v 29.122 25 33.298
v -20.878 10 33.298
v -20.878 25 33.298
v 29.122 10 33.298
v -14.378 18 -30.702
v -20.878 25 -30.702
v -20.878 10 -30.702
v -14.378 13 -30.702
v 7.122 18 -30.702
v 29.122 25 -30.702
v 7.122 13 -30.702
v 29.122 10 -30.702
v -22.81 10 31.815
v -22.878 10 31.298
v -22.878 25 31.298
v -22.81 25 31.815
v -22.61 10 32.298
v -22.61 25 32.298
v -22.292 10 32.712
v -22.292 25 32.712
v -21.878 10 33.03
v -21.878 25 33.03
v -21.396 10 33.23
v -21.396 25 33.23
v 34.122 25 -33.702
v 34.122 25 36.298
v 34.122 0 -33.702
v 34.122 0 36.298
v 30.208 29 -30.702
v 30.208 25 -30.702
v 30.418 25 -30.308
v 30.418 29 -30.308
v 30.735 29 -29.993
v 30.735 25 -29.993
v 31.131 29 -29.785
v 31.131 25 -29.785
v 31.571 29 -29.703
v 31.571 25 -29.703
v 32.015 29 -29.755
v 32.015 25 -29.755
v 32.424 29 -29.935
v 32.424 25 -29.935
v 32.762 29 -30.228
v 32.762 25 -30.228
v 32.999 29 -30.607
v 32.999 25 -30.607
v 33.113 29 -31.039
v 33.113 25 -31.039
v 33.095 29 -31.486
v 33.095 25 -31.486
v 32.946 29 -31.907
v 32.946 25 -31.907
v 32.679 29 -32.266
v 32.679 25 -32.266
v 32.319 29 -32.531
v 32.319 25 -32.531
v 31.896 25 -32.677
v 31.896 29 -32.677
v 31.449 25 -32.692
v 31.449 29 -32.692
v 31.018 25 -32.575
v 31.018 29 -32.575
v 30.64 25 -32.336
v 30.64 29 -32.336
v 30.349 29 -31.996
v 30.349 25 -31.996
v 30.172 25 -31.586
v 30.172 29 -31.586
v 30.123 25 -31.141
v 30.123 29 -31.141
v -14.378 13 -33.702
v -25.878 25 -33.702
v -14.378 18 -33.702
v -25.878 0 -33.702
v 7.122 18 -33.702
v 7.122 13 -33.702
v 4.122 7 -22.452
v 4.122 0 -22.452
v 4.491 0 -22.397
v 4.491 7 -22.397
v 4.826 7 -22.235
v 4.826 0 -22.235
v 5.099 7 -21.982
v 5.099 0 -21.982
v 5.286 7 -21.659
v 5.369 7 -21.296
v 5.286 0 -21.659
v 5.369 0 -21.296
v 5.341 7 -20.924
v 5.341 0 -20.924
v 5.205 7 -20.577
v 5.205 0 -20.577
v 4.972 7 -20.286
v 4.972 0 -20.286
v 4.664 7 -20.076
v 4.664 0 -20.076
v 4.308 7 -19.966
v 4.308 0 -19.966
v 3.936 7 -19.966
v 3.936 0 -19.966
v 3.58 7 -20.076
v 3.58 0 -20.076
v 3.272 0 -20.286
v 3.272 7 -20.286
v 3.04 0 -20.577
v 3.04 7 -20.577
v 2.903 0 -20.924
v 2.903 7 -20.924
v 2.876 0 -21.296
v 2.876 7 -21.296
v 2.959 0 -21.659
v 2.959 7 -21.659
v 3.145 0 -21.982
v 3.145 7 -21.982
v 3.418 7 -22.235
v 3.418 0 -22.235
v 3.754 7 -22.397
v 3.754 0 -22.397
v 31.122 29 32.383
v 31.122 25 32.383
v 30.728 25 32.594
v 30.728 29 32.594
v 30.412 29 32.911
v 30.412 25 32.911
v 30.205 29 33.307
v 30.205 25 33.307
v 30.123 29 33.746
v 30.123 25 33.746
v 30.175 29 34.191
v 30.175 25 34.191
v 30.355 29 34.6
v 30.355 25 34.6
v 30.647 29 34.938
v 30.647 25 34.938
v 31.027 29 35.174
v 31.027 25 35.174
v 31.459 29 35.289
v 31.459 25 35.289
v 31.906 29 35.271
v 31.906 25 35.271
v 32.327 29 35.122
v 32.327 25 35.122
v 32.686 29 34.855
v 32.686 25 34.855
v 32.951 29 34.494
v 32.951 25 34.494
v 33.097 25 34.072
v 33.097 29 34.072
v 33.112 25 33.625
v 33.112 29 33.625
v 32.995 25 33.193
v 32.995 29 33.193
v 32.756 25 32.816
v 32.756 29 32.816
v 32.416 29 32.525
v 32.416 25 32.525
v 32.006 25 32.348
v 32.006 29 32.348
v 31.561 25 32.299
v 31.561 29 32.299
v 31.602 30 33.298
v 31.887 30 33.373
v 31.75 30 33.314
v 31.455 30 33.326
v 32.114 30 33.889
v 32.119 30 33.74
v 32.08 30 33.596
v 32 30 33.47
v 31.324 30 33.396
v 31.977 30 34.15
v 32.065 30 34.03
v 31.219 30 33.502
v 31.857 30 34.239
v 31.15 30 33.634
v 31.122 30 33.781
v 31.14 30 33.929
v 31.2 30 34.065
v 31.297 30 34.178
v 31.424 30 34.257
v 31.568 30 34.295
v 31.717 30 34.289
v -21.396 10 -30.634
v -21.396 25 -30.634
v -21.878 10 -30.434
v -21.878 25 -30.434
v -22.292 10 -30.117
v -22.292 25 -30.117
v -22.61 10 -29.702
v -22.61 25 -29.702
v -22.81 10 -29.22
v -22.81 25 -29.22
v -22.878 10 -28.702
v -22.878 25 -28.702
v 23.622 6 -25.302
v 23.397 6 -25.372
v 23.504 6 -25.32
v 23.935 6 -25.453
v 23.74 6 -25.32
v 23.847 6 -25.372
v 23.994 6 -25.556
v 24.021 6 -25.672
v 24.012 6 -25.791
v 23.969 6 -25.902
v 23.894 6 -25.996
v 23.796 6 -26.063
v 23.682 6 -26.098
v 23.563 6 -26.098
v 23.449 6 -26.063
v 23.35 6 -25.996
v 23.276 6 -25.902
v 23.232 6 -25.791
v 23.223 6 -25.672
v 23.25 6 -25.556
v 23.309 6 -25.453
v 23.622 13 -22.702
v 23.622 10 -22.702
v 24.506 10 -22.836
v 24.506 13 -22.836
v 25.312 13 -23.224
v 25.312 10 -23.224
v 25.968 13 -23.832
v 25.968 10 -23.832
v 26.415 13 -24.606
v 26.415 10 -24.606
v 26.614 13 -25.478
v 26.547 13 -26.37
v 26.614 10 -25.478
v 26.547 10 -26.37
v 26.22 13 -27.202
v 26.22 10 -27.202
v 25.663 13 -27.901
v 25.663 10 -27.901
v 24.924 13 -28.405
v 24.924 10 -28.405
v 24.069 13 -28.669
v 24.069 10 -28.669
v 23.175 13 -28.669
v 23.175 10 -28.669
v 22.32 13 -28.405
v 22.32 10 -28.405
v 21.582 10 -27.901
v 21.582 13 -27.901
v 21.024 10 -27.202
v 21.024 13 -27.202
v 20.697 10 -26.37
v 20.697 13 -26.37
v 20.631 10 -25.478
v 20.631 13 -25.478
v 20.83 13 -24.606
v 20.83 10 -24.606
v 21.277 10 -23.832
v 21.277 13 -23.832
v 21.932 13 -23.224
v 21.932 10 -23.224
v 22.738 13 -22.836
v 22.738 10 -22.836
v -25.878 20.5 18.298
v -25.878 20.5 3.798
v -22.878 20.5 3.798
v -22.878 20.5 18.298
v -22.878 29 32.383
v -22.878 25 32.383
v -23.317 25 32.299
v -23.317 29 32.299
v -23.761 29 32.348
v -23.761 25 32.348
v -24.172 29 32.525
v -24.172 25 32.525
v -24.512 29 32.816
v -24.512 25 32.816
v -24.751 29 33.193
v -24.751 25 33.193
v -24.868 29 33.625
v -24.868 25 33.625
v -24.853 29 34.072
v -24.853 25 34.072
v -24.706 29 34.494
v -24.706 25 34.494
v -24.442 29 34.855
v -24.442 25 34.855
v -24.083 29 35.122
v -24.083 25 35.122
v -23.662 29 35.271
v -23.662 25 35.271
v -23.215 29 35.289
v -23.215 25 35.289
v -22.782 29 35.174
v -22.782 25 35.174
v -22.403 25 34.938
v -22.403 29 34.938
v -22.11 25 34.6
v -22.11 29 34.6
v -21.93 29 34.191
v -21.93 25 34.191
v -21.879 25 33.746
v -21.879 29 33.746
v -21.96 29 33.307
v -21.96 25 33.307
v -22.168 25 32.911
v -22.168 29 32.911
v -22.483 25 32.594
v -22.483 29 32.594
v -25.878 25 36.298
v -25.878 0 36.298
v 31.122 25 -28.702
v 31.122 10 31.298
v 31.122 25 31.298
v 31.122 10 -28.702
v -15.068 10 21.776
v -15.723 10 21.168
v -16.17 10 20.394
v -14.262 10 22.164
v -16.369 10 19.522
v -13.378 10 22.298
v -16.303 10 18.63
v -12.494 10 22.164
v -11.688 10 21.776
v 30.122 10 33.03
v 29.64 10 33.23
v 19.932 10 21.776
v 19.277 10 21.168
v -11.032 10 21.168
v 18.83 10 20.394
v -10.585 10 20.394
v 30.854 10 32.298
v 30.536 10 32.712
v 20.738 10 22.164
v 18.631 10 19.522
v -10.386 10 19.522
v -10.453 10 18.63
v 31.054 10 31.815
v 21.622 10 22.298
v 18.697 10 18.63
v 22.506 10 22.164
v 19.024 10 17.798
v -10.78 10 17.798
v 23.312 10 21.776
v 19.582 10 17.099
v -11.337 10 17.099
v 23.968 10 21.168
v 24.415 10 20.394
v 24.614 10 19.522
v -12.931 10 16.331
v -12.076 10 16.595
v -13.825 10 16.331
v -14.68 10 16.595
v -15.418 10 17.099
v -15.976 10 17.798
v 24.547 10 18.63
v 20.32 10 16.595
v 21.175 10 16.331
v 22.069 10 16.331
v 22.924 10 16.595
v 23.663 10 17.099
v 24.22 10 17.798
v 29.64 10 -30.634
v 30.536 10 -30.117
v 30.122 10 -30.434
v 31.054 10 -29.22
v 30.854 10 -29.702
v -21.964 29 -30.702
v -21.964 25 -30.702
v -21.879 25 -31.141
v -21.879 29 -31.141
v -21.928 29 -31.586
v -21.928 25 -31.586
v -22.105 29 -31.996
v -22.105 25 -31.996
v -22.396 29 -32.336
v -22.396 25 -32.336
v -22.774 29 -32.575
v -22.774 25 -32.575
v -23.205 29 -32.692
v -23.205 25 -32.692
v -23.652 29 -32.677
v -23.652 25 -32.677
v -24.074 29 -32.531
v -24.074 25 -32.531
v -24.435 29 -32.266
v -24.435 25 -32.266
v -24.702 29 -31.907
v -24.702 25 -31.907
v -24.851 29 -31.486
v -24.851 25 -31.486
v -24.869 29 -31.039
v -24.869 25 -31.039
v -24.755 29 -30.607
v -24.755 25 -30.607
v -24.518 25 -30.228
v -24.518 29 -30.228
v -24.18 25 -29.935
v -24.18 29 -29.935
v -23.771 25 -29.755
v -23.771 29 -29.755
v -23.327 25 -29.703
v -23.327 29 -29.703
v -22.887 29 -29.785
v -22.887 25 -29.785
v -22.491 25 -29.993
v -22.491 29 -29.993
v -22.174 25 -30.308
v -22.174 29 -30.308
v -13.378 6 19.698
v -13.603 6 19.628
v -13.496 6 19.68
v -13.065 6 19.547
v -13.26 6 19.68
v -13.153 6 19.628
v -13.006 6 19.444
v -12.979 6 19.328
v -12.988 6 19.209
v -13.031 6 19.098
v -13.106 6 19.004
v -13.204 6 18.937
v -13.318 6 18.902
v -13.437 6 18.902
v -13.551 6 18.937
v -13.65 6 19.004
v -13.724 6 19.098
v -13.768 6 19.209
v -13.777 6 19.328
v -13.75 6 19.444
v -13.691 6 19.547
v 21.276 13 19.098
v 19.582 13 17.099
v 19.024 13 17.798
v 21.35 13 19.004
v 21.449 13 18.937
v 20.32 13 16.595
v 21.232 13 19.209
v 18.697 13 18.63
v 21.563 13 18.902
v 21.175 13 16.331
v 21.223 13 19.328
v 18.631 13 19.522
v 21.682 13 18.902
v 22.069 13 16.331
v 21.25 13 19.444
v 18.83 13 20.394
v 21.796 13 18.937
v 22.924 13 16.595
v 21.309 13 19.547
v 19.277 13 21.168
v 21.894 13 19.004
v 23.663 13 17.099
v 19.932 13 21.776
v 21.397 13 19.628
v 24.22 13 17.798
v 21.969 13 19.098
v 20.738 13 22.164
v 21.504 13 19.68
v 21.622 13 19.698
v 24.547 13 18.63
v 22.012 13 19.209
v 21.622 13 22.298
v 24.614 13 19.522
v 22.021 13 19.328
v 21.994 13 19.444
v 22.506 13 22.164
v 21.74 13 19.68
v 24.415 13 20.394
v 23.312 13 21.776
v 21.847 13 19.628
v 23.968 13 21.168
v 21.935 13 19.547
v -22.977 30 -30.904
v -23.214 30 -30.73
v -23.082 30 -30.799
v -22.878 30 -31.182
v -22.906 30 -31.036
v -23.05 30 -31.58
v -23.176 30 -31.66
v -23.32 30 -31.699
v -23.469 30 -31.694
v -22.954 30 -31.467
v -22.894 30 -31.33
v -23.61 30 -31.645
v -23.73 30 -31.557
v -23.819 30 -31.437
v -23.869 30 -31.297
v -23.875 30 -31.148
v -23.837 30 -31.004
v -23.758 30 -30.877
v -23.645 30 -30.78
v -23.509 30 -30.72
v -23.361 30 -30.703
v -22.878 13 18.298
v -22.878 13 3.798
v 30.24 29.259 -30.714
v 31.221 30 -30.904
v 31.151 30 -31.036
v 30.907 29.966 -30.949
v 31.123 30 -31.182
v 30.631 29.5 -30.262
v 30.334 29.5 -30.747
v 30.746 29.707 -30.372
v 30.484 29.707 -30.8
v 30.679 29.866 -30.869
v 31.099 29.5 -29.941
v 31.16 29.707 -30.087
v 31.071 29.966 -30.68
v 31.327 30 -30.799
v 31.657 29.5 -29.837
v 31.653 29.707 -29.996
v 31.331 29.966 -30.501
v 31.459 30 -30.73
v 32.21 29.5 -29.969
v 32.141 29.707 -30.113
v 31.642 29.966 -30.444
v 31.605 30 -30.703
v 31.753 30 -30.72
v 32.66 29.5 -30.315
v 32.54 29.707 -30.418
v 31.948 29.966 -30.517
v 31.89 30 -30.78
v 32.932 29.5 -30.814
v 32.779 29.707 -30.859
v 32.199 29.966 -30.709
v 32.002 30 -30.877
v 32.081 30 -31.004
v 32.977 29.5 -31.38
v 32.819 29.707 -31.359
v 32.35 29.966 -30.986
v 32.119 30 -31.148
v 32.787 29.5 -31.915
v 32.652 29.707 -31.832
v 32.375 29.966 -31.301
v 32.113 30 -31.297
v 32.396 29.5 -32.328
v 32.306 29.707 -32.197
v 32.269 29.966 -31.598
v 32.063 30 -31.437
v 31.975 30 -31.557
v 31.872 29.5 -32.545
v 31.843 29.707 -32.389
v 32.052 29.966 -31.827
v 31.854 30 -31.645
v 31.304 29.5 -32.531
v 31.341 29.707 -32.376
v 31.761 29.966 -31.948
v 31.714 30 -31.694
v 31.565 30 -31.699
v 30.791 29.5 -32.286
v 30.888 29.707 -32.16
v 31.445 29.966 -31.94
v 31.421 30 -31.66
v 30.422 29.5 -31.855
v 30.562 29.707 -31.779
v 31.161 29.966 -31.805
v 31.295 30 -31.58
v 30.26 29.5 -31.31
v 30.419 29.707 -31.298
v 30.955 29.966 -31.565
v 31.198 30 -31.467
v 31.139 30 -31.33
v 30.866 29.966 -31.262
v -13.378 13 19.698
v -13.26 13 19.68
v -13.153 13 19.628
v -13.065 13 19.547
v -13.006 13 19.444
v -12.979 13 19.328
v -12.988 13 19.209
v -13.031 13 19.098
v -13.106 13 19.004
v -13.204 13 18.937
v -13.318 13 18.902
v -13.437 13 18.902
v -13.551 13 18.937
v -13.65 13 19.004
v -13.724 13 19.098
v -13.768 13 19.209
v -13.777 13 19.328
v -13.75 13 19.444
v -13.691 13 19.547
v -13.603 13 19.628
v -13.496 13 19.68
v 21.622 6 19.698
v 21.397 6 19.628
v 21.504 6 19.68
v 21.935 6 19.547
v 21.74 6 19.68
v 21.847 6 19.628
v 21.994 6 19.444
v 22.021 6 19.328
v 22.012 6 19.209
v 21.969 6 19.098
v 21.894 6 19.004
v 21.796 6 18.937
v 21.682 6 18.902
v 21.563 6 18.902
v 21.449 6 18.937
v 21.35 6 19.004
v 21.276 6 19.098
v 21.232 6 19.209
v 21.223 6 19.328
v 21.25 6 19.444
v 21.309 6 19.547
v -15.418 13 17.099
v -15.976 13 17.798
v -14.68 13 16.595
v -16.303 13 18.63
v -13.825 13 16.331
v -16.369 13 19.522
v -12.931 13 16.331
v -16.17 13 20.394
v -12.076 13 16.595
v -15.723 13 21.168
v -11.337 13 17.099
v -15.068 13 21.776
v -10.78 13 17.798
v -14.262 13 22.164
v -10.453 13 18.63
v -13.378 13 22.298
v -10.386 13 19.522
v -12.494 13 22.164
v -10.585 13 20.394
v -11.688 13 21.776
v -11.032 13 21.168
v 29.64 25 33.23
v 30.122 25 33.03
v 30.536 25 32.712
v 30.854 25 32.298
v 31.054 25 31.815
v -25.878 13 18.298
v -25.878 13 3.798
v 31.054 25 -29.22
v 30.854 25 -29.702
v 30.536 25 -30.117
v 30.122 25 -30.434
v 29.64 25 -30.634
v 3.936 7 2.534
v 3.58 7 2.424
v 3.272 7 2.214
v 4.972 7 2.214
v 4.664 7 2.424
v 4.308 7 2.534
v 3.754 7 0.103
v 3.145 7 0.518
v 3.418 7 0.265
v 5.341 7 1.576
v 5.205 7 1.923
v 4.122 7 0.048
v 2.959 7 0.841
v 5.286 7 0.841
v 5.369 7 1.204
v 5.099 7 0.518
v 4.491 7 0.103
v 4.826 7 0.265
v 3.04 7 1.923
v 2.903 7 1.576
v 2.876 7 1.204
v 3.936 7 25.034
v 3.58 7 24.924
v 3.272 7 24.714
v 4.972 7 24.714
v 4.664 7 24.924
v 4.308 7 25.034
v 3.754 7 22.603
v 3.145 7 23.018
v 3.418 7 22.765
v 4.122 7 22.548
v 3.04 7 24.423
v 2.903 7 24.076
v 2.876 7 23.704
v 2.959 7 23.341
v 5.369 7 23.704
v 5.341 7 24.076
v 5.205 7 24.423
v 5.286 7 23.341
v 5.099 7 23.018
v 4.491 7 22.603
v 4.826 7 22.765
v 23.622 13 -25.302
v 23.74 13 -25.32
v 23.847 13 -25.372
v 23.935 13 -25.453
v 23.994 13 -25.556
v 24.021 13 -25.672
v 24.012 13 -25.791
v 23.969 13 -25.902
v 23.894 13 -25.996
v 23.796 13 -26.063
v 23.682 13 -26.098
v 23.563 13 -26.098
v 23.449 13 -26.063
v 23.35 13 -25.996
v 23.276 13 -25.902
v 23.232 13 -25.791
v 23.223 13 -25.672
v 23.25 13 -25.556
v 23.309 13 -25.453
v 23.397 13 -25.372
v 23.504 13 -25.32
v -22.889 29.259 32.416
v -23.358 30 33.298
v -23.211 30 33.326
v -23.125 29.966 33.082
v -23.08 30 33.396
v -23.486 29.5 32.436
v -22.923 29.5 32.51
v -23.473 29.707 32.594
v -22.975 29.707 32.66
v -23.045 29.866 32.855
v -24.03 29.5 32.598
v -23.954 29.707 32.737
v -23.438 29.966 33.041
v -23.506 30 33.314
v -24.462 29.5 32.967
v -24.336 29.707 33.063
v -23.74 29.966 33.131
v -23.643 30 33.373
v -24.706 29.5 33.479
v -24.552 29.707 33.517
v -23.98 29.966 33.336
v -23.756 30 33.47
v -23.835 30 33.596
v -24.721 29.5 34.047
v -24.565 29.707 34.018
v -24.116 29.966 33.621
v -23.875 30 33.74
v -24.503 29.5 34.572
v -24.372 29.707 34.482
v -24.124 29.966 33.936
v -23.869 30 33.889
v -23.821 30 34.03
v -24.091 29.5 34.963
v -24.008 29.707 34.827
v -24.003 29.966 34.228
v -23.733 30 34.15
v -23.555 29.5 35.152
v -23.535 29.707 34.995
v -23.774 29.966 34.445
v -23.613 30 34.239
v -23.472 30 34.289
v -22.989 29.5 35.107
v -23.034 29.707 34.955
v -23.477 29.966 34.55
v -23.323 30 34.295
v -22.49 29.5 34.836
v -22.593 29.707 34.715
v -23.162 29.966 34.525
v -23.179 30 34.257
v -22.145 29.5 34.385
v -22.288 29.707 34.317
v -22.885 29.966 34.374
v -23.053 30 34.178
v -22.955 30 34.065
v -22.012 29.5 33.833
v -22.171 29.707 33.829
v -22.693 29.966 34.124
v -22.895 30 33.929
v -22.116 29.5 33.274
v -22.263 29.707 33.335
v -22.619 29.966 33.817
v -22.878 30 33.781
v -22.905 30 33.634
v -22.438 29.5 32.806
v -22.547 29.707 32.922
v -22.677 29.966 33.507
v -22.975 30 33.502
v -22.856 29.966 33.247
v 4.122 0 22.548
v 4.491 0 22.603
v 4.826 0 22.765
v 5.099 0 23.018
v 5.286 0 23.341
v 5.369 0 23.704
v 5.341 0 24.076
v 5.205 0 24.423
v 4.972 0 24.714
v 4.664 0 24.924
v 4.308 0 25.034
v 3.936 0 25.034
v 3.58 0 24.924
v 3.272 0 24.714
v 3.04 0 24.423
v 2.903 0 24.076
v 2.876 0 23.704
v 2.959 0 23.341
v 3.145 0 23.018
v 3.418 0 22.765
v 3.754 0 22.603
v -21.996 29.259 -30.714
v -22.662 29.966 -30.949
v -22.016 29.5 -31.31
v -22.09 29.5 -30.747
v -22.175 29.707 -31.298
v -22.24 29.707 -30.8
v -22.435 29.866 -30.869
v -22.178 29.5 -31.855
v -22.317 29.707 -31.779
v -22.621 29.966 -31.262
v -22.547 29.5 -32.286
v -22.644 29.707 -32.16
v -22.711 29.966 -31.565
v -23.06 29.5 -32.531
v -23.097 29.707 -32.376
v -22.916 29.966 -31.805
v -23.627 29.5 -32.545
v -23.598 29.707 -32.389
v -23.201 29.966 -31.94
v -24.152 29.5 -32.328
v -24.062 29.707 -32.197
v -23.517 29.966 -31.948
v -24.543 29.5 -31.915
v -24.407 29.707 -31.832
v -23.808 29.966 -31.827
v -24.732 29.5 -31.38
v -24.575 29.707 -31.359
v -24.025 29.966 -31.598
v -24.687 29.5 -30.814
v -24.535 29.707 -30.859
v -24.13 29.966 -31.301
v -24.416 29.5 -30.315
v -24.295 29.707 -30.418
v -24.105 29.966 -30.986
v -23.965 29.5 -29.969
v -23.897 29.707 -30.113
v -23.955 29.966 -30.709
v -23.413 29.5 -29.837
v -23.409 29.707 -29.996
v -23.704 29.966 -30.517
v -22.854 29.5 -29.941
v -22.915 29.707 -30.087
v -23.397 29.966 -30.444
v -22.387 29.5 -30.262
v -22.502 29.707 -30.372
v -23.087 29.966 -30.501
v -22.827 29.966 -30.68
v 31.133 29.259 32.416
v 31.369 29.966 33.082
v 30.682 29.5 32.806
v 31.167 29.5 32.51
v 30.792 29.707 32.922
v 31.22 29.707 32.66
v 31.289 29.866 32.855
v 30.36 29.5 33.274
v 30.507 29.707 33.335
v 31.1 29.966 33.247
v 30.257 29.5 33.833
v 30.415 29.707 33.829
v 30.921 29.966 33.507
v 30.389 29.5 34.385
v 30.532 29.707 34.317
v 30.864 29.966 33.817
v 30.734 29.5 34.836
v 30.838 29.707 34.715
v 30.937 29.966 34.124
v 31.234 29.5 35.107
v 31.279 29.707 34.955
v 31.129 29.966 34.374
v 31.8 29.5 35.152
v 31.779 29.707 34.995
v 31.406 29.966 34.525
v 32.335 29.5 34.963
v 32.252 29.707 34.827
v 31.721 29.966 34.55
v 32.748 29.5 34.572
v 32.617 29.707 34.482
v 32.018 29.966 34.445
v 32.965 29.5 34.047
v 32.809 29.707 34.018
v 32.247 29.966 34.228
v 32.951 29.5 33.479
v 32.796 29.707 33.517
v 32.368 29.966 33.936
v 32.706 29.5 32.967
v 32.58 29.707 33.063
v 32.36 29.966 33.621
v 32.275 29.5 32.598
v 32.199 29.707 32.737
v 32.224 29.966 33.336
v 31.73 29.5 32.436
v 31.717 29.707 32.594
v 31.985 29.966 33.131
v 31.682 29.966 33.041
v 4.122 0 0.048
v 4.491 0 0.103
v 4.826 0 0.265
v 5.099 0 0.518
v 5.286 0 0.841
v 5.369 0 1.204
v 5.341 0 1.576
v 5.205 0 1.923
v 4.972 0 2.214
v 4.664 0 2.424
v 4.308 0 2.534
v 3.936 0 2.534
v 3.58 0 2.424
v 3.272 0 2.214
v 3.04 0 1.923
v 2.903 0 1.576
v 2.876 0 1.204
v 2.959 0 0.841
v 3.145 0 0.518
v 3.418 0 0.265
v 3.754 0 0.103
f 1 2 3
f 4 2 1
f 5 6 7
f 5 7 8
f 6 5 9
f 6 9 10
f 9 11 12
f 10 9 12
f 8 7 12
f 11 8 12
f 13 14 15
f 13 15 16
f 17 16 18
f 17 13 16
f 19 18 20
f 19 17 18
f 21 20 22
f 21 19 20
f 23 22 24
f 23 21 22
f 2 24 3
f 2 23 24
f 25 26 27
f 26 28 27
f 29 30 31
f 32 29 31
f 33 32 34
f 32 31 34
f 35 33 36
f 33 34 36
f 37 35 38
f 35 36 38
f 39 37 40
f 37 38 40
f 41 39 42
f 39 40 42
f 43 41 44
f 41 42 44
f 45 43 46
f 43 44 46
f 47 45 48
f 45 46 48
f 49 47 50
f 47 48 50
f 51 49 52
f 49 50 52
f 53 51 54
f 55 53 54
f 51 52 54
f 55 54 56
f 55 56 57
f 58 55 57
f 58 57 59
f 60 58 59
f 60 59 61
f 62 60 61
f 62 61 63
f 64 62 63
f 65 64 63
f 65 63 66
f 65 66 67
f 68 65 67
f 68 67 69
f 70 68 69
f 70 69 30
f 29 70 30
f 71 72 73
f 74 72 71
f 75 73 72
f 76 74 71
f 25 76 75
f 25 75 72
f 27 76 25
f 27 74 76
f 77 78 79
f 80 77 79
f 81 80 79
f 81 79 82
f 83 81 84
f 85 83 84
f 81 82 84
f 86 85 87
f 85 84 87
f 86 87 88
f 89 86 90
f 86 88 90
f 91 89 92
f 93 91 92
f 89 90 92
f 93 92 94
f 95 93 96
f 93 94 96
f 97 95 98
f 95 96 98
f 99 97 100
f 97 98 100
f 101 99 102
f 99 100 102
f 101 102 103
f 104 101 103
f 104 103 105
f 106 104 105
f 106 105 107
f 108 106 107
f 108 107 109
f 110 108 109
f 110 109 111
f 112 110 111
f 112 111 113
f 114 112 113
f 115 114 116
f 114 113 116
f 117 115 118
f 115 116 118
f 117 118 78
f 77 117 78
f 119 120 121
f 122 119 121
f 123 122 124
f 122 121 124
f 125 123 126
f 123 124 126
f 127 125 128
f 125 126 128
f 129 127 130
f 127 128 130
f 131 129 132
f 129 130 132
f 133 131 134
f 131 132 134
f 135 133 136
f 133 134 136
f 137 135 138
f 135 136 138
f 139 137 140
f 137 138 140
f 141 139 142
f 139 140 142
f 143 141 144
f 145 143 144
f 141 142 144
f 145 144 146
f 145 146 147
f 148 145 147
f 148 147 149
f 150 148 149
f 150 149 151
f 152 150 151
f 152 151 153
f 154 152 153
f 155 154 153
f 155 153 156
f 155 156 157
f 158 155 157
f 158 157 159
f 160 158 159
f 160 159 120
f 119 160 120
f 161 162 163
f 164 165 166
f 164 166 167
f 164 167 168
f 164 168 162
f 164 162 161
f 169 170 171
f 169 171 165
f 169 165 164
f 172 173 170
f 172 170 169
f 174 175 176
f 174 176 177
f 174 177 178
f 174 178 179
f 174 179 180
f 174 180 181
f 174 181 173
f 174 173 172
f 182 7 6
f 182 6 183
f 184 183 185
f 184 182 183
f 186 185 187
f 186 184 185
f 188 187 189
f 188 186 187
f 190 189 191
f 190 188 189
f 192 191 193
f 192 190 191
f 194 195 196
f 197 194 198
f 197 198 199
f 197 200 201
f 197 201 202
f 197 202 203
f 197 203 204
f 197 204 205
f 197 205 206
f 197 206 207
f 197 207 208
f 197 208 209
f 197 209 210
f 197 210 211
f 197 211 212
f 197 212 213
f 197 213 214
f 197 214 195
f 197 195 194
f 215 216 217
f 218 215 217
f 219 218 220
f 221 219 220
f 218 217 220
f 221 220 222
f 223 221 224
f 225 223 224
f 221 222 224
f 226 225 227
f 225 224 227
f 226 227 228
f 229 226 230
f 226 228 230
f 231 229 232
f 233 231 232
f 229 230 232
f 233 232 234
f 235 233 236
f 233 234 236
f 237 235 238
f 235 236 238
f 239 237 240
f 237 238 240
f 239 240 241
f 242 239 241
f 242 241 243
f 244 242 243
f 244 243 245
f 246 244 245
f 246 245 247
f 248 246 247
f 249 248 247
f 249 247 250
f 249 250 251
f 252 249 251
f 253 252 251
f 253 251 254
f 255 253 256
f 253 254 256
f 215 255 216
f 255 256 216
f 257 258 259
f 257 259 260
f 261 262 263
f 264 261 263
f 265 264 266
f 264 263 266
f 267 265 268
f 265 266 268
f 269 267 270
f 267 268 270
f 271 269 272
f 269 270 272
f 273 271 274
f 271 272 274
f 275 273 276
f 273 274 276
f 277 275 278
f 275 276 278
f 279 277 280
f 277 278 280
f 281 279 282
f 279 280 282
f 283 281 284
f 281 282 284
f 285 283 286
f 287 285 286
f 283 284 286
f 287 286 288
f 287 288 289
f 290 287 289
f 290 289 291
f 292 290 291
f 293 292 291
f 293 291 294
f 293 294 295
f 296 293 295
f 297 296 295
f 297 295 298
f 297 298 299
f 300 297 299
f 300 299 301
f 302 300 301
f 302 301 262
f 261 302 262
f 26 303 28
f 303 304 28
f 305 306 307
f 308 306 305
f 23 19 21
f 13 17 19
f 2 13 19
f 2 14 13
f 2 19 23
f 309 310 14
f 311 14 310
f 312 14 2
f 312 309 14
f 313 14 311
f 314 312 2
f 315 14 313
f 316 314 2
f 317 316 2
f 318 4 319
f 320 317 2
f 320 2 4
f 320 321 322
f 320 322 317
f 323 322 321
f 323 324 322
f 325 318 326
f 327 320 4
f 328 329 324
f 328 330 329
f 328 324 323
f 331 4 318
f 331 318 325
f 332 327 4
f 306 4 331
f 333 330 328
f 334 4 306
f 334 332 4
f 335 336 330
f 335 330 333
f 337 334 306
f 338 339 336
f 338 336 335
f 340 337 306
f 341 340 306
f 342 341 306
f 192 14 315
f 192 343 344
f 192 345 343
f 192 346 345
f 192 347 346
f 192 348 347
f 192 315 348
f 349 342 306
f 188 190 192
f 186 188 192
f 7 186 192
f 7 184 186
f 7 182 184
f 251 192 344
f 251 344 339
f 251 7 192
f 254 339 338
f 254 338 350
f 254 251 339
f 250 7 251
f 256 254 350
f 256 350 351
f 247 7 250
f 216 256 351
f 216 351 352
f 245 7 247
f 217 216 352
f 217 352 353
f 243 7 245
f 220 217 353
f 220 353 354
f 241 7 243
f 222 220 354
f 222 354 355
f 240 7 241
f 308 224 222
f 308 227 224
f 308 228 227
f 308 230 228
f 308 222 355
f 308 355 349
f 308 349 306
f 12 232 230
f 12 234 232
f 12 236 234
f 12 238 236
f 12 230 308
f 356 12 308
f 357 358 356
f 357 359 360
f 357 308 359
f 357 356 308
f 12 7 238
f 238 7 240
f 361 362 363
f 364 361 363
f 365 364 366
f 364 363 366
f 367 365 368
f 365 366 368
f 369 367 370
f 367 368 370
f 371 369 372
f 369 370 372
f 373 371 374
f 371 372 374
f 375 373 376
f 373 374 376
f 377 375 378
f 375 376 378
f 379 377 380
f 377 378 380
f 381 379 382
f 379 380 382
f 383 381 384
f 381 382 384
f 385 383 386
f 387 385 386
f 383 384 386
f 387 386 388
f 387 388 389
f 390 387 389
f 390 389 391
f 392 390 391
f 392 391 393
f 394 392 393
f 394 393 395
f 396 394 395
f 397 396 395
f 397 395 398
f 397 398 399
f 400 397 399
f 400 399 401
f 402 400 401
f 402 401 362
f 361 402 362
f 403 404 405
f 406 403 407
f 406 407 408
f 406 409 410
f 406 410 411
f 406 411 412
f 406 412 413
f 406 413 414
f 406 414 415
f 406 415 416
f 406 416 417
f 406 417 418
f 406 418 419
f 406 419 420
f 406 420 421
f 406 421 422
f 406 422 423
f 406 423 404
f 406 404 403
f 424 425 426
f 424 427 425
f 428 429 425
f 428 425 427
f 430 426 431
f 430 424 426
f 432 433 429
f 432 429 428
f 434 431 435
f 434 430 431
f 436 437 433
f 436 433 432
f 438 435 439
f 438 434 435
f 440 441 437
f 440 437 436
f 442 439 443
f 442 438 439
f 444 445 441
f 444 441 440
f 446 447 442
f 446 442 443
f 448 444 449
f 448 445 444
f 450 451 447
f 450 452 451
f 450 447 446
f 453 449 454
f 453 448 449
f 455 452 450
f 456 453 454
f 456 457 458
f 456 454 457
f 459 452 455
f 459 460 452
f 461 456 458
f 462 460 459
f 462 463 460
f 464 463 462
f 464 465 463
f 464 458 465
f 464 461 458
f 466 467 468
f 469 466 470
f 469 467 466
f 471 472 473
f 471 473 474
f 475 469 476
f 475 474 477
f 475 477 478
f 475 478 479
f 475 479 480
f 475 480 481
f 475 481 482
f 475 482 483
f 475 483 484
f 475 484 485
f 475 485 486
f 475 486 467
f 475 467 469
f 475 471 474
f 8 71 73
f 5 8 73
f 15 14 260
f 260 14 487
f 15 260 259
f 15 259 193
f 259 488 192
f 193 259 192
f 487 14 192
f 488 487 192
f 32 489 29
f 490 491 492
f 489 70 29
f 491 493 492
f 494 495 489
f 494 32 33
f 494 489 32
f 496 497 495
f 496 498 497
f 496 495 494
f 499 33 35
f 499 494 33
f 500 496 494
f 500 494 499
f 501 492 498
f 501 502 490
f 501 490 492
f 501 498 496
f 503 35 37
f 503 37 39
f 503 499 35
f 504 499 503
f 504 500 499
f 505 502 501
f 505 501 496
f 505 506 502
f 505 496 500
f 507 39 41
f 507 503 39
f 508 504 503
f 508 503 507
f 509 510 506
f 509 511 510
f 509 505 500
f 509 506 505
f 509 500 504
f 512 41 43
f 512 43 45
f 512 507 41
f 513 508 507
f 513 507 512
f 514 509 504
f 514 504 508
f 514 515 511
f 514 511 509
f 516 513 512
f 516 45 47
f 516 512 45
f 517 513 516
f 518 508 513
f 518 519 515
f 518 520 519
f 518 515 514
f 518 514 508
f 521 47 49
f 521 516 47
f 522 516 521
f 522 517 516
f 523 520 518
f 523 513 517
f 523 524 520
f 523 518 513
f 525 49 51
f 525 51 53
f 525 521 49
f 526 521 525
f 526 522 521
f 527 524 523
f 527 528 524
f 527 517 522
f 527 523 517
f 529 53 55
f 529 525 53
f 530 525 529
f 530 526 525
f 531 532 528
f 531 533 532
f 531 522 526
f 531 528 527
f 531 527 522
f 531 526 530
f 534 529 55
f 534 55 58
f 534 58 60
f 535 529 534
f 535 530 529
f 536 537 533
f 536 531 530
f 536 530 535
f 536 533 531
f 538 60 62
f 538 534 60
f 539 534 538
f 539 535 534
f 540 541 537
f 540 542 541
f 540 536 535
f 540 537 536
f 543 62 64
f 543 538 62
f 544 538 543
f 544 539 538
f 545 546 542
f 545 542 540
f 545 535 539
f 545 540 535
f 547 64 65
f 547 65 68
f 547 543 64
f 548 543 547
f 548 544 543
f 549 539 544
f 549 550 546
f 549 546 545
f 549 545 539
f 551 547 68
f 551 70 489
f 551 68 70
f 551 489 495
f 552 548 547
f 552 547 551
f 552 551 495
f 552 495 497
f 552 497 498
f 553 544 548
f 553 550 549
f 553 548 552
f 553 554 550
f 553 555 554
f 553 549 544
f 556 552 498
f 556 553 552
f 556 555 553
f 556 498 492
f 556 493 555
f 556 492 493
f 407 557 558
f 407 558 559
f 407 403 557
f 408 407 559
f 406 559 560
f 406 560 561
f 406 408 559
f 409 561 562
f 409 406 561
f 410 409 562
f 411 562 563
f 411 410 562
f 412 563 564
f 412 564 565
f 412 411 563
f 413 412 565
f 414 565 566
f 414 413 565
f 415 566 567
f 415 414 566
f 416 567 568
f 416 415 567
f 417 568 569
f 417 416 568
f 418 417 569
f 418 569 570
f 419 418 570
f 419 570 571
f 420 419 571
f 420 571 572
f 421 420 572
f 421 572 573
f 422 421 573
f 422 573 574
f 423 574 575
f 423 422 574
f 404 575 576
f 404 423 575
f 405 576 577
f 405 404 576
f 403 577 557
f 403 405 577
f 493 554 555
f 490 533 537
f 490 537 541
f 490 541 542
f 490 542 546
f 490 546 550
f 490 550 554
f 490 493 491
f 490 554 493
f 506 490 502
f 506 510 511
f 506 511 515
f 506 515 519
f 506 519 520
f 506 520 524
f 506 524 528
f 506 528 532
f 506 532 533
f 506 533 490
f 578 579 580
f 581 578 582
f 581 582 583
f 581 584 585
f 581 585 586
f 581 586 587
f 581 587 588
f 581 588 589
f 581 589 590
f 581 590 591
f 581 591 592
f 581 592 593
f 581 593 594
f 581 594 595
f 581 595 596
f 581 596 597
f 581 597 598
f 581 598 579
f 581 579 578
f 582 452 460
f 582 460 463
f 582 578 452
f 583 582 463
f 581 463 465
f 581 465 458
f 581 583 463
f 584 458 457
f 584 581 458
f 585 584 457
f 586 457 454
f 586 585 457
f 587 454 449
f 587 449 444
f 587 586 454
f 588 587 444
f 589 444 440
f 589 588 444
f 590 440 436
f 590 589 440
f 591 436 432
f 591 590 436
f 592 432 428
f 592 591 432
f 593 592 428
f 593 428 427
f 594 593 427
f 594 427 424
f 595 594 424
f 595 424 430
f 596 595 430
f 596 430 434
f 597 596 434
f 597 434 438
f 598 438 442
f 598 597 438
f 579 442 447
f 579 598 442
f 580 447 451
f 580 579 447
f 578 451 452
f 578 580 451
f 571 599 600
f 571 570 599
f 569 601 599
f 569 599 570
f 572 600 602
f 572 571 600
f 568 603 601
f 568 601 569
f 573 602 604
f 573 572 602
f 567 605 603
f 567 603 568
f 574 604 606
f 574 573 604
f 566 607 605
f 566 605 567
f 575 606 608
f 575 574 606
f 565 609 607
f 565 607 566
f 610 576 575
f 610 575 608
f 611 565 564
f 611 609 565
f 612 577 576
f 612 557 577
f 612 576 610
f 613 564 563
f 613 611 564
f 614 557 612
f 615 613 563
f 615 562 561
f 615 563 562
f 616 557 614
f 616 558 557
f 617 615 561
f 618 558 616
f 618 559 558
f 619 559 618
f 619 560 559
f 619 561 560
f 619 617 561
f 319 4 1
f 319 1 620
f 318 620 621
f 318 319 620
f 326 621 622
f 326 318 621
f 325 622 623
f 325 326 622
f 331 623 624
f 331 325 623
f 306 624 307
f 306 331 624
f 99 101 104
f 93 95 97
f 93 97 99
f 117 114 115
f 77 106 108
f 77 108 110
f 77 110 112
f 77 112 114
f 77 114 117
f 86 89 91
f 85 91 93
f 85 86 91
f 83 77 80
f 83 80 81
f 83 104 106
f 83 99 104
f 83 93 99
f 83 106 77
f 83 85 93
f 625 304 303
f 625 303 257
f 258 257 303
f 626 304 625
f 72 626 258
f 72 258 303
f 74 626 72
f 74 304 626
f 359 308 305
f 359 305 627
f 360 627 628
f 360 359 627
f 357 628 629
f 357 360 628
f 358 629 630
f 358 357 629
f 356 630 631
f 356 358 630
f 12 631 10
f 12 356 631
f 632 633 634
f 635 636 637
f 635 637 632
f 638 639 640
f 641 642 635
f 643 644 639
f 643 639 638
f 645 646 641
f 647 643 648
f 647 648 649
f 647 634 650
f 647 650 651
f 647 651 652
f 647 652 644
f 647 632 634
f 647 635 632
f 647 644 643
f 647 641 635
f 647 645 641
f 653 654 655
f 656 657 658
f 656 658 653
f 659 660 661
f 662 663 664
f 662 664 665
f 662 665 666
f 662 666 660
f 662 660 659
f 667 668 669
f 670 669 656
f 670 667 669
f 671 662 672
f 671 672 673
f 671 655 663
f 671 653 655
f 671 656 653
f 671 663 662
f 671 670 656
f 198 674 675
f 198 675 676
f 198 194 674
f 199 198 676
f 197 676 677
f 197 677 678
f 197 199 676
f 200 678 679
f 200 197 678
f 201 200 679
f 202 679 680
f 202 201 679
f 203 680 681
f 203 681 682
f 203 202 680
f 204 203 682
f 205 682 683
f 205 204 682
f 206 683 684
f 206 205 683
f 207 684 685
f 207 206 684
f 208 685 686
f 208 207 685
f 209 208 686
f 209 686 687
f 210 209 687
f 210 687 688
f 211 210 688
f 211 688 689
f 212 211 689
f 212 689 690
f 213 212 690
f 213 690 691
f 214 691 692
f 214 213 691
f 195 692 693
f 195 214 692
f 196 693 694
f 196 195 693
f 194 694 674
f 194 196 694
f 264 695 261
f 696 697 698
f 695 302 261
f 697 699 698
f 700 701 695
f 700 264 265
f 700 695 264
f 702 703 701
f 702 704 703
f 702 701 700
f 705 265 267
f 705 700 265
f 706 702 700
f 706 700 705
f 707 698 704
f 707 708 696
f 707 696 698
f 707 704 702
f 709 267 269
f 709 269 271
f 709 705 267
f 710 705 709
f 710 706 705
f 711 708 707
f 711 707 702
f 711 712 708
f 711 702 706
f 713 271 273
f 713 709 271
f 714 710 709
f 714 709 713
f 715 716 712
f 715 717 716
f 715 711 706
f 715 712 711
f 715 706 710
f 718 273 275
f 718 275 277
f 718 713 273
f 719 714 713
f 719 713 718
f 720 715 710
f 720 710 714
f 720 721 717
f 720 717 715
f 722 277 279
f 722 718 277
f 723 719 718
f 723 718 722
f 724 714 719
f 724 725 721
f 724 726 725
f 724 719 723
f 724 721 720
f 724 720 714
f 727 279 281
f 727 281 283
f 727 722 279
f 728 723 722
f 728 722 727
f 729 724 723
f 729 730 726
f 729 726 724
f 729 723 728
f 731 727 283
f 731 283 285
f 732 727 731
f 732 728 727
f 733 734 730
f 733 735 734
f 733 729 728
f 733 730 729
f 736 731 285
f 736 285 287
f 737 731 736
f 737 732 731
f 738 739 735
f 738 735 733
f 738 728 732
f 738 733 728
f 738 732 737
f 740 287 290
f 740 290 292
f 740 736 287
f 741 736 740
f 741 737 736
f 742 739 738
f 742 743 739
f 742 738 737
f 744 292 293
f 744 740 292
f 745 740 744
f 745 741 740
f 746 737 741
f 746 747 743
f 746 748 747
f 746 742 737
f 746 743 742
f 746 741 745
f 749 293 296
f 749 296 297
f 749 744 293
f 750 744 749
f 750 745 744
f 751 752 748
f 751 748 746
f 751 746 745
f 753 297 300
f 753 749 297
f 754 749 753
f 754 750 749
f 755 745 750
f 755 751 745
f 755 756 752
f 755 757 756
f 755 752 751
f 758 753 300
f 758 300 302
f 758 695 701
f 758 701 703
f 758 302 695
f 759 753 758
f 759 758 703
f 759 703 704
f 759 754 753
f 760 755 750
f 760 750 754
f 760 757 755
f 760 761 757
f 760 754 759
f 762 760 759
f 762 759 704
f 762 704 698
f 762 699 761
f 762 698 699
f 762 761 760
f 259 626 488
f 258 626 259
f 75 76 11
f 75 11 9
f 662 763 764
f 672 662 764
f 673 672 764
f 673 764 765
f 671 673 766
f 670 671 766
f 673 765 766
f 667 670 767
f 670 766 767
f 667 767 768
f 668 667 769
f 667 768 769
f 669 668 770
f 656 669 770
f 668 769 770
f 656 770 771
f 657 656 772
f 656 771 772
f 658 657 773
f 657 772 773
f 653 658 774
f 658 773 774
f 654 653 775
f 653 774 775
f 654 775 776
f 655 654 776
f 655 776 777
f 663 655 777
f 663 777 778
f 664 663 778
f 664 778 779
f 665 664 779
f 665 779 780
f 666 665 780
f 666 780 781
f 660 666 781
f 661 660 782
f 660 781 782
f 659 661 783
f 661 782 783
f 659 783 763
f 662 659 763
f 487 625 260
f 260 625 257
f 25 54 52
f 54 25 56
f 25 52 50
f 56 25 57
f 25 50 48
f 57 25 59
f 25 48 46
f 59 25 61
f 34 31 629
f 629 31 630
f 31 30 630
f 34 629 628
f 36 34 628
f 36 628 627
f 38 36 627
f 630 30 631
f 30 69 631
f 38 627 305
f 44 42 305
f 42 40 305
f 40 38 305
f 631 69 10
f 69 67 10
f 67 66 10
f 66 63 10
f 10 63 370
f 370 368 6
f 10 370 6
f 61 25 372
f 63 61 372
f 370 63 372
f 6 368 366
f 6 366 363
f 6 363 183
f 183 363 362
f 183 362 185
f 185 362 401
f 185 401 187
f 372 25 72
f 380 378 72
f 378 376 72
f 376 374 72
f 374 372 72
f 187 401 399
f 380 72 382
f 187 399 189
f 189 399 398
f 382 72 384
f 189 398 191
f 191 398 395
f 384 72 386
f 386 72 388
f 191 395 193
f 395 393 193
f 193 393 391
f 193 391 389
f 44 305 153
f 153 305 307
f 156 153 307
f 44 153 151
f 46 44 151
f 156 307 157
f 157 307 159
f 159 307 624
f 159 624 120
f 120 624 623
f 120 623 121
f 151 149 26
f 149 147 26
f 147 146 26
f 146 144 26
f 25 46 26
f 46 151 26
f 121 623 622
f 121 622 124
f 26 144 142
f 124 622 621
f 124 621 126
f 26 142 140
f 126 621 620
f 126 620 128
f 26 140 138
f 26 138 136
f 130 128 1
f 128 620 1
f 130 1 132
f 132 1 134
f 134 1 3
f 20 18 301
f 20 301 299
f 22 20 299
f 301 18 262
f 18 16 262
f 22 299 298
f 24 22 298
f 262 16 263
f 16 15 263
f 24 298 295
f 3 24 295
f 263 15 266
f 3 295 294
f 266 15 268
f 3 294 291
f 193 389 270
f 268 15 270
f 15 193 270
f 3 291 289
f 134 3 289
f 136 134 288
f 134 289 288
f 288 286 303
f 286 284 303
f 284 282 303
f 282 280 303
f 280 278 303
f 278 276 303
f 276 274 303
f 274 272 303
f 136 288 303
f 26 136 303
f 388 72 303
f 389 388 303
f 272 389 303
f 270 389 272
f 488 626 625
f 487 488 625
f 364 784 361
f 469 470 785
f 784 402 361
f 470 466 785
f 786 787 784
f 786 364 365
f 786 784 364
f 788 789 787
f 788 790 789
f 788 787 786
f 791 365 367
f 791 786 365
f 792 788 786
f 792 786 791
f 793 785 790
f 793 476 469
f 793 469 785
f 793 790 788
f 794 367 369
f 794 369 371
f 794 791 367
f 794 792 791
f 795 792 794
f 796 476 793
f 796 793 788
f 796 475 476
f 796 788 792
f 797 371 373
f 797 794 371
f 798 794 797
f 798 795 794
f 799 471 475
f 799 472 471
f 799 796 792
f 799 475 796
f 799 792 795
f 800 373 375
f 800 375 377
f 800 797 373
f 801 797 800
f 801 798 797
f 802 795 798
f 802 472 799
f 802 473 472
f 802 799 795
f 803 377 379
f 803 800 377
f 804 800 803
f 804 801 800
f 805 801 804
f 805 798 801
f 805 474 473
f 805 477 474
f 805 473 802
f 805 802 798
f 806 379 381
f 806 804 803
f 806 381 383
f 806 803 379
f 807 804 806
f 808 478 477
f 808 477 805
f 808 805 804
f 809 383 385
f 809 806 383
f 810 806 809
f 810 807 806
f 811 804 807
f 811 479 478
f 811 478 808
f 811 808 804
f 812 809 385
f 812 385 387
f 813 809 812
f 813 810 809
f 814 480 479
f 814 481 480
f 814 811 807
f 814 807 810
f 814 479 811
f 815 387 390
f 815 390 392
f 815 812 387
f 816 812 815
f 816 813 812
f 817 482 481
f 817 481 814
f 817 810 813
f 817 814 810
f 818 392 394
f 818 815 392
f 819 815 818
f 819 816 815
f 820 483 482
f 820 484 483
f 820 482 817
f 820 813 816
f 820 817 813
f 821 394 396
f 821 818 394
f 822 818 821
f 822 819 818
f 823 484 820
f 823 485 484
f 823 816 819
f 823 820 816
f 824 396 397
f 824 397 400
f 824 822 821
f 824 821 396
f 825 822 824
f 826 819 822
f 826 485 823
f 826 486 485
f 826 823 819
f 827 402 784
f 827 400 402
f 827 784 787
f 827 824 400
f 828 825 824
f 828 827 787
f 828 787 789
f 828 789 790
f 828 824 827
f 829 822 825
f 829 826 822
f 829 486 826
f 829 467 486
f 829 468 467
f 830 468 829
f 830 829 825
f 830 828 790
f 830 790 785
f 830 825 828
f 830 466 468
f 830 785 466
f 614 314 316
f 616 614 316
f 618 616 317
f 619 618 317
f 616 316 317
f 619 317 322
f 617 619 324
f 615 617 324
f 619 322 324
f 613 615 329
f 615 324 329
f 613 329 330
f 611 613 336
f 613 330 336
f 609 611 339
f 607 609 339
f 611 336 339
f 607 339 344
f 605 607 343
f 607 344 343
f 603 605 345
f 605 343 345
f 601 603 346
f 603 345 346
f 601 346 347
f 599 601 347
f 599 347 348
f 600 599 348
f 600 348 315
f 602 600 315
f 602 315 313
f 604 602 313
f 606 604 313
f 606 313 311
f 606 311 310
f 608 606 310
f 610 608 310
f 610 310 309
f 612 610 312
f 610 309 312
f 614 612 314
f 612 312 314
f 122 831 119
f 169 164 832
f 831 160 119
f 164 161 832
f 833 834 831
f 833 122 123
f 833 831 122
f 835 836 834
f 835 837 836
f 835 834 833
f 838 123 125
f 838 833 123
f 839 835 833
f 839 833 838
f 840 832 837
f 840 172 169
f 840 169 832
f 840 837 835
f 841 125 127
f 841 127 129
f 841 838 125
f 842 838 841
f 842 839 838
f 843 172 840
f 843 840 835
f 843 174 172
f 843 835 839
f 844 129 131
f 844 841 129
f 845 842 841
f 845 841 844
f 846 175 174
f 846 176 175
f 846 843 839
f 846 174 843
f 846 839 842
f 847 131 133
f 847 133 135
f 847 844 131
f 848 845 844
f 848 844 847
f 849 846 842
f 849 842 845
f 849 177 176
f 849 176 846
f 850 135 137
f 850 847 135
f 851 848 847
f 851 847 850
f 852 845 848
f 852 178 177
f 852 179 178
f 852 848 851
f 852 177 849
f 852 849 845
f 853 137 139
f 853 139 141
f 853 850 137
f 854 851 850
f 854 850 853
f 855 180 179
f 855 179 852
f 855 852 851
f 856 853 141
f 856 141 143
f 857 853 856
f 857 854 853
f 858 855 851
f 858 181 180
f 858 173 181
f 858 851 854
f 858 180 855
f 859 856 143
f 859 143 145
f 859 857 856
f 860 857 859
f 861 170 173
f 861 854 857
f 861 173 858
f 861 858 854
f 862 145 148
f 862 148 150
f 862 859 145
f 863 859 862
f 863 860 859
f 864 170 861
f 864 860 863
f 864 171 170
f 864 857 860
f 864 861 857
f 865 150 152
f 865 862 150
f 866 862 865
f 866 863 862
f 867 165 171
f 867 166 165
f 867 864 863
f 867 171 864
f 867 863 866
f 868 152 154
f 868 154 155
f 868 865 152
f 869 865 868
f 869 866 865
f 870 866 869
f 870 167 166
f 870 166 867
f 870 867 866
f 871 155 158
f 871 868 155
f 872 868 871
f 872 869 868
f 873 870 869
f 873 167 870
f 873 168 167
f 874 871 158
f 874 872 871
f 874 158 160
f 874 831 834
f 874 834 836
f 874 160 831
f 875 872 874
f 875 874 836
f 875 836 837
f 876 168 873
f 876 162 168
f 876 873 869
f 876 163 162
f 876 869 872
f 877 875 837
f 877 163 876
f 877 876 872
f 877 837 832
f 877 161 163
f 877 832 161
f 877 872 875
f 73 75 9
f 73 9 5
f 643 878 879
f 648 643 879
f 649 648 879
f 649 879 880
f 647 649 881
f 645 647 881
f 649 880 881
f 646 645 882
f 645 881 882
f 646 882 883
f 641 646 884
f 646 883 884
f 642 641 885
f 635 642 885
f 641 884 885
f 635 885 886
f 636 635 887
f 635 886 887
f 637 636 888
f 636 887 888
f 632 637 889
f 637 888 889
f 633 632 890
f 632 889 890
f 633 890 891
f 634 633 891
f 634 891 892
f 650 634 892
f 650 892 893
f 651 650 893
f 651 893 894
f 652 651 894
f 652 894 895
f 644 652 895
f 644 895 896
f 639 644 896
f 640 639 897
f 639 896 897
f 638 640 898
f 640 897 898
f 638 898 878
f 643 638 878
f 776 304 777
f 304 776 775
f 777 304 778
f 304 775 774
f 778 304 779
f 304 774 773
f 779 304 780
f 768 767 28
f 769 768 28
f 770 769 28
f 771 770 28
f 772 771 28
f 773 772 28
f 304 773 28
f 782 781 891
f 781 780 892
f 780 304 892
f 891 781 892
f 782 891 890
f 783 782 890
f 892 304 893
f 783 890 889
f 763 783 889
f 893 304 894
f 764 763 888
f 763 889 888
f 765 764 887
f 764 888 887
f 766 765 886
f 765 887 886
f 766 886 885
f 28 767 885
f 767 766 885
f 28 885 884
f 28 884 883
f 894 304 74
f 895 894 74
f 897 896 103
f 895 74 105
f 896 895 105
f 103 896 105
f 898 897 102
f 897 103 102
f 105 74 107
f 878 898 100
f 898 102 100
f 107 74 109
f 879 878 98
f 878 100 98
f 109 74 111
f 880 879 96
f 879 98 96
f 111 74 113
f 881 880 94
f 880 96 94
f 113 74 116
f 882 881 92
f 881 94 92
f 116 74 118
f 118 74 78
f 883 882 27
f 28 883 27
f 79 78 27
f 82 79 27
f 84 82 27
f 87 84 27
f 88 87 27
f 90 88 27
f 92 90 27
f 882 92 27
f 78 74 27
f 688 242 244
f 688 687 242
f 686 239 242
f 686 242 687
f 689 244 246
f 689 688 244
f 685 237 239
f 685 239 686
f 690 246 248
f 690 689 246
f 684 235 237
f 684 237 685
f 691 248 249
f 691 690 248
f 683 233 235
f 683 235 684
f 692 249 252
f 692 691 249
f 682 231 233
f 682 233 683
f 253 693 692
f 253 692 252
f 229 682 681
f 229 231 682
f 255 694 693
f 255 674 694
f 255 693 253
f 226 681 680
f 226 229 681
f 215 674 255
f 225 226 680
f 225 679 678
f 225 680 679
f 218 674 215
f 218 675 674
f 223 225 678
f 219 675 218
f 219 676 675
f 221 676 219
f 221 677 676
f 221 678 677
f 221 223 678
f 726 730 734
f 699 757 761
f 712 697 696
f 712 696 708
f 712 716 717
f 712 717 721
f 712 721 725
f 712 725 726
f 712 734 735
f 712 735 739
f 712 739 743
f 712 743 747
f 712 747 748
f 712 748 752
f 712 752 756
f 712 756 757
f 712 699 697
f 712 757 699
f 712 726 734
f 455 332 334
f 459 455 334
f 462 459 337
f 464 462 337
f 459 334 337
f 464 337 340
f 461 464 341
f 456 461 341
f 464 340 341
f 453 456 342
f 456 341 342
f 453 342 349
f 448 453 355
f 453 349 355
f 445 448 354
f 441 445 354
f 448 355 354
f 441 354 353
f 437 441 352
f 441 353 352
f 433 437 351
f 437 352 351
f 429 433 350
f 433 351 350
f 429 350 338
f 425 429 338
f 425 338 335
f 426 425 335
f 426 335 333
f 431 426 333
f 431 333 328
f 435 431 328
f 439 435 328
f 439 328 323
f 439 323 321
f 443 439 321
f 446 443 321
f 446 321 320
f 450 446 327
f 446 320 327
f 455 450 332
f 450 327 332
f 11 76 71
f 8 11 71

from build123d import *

# Parameters (mm, degrees)
SKETCH1_W           = 60
SKETCH1_H           = 70
BOSS_EXTRUDE1_DEPTH = 10
SKETCH2_W           = 60
SKETCH2_H           = 70
SKETCH2_W_2         = 54
SKETCH2_H_2         = 64
BOSS_EXTRUDE2_DEPTH = 15
SKETCH3_R           = 1.5
BOSS_EXTRUDE3_DEPTH = 5
SKETCH8_R           = 3
SKETCH8_R_2         = 0.4
BOSS_EXTRUDE4_DEPTH = 3
CUT_EXTRUDE1_START  = -4
SKETCH11_R          = 0.4
CUT_EXTRUDE1_DEPTH  = 4
SKETCH12_W          = 21.5
SKETCH12_H          = 5
CUT_EXTRUDE2_DEPTH  = 5
FILLET2_R           = 1
SKETCH18_R          = 1.25
CUT_EXTRUDE6_DEPTH  = 7
SKETCH20_W          = 14.5
SKETCH20_H          = 7.5
CUT_EXTRUDE7_DEPTH  = 7
FILLET3_R           = 2


with BuildPart() as part:
    # Sketch1 → Boss-Extrude1 (new body)
    with BuildSketch(Plane(origin=(0, 0, 0), x_dir=(1, 0, 0), z_dir=(0, 1, 0))):
        with Locations((4.122137405, -1.297709924)):
            Rectangle(SKETCH1_W, SKETCH1_H)
    extrude(amount=BOSS_EXTRUDE1_DEPTH)

    # Sketch2 → Boss-Extrude2 (add)
    with BuildSketch(Plane(origin=(0, 10, 0), x_dir=(1, 0, 0), z_dir=(0, 1, 0))):
        with Locations((4.122137405, -1.297709924)):
            Rectangle(SKETCH2_W, SKETCH2_H)
        with Locations((4.122137405, -1.297709924)):
            Rectangle(SKETCH2_W_2, SKETCH2_H_2, mode=Mode.SUBTRACT)
    extrude(amount=BOSS_EXTRUDE2_DEPTH)

    # Sketch3 → Boss-Extrude3 (add)
    with BuildSketch(Plane(origin=(0, 25, 0), x_dir=(1, 0, 0), z_dir=(0, 1, 0))):
        with Locations(Location((-23.377862595, 31.202290076, 0), (0, 0, 340.528779366))):
            Circle(SKETCH3_R)
        with Locations(Location((31.622137405, 31.202290076, 0), (0, 0, 199.471220634))):
            Circle(SKETCH3_R)
        with Locations(Location((31.622137405, -33.797709924, 0), (0, 0, 109.471220634))):
            Circle(SKETCH3_R)
        with Locations(Location((-23.377862595, -33.797709924, 0), (0, 0, 70.528779366))):
            Circle(SKETCH3_R)
    extrude(amount=BOSS_EXTRUDE3_DEPTH)

    # Sketch8 → Boss-Extrude4 (add)
    # profile 1 of 3: a face of its own
    with BuildSketch(Plane(origin=(0, 10, 0), x_dir=(1, 0, 0), z_dir=(0, 1, 0))):
        with Locations(Location((21.622137405, -19.297709924, 0), (0, 0, 270))):
            Circle(SKETCH8_R)
        with Locations(Location((21.622137405, -19.297709924, 0), (0, 0, 270))):
            Circle(SKETCH8_R_2, mode=Mode.SUBTRACT)
    # profile 2 of 3: a face of its own
    with BuildSketch(Plane(origin=(0, 10, 0), x_dir=(1, 0, 0), z_dir=(0, 1, 0))):
        with Locations(Location((-13.377862595, -19.297709924, 0), (0, 0, 270))):
            Circle(SKETCH8_R)
        with Locations(Location((-13.377862595, -19.297709924, 0), (0, 0, 270))):
            Circle(SKETCH8_R_2, mode=Mode.SUBTRACT)
    # profile 3 of 3: a face of its own
    with BuildSketch(Plane(origin=(0, 10, 0), x_dir=(1, 0, 0), z_dir=(0, 1, 0))):
        with Locations(Location((23.622137405, 25.702290076, 0), (0, 0, 270))):
            Circle(SKETCH8_R)
        with Locations(Location((23.622137405, 25.702290076, 0), (0, 0, 270))):
            Circle(SKETCH8_R_2, mode=Mode.SUBTRACT)
    extrude(amount=BOSS_EXTRUDE4_DEPTH)

    # Sketch11 → Cut-Extrude1 (cut)
    with BuildSketch(Plane(origin=(0, 10, 0), x_dir=(1, 0, 0), z_dir=(0, 1, 0)).offset(CUT_EXTRUDE1_START)):
        with Locations(Location((-13.377862595, -19.297709924, 0), (0, 0, 270))):
            Circle(SKETCH11_R)
        with Locations(Location((21.622137405, -19.297709924, 0), (0, 0, 270))):
            Circle(SKETCH11_R)
        with Locations(Location((23.622137405, 25.702290076, 0), (0, 0, 270))):
            Circle(SKETCH11_R)
    extrude(amount=CUT_EXTRUDE1_DEPTH, mode=Mode.SUBTRACT)

    # Sketch12 → Cut-Extrude2 (cut)
    with BuildSketch(Plane(origin=(0, 0, -33.702290076), x_dir=(-1, 0, 0), z_dir=(0, 0, -1))):
        with Locations((3.627862595, 15.5)):
            Rectangle(SKETCH12_W, SKETCH12_H)
    extrude(amount=-CUT_EXTRUDE2_DEPTH, mode=Mode.SUBTRACT)

    # Fillet2
    fillet2_edges = [part.edges().sort_by_distance(p)[0] for p in [
        (-24.792076158, 30, -31.702290076),
        (33.036350967, 30, -31.702290076),
        (32.122137405, 30, 35.211923486),
        (-23.877862595, 30, 35.211923486),
    ]]
    fillet(fillet2_edges, radius=FILLET2_R)

    # Sketch18 → Cut-Extrude6 (cut)
    with BuildSketch(Plane.XZ):
        with Locations(Location((4.122137405, 23.797709924, 0), (0, 0, 270))):
            Circle(SKETCH18_R)
        with Locations(Location((4.122137405, 1.297709924, 0), (0, 0, 270))):
            Circle(SKETCH18_R)
        with Locations(Location((4.122137405, -21.202290076, 0), (0, 0, 270))):
            Circle(SKETCH18_R)
    extrude(amount=-CUT_EXTRUDE6_DEPTH, mode=Mode.SUBTRACT)

    # Sketch20 → Cut-Extrude7 (cut)
    with BuildSketch(Plane.ZY.offset(25.877862595)):
        with Locations((11.047709924, 16.75)):
            Rectangle(SKETCH20_W, SKETCH20_H)
    extrude(amount=-CUT_EXTRUDE7_DEPTH, mode=Mode.SUBTRACT)

    # Fillet3
    # the kernel refuses this fillet: 2 mm, written as the material it adds along each edge
    with BuildSketch(Plane(origin=(-22.877862595, 5, -30.702290076), x_dir=(0, 0, 1), z_dir=(0, 1, 0)), Plane(origin=(31.122137405, 5, -30.702290076), x_dir=(-1, 0, 0), z_dir=(0, 1, 0))) as fillet3_piece_1:
        with BuildLine():
            CenterArc((FILLET3_R, FILLET3_R), FILLET3_R, 180, 90)
            Line((0, FILLET3_R), (0, 0))
            Line((0, 0), (FILLET3_R, 0))
        make_face()
    extrude(amount=20)
    with BuildSketch(Plane(origin=(-22.877862595, 5, 33.297709924), x_dir=(0, 0, -1), z_dir=(0, 1, 0)), Plane(origin=(31.122137405, 5, 33.297709924), x_dir=(-1, 0, 0), z_dir=(0, 1, 0))) as fillet3_piece_2:
        with BuildLine():
            CenterArc((FILLET3_R, -FILLET3_R), FILLET3_R, 90, 90)
            Line((0, -FILLET3_R), (0, 0))
            Line((0, 0), (FILLET3_R, 0))
        make_face()
    extrude(amount=20)


solid = part.part
